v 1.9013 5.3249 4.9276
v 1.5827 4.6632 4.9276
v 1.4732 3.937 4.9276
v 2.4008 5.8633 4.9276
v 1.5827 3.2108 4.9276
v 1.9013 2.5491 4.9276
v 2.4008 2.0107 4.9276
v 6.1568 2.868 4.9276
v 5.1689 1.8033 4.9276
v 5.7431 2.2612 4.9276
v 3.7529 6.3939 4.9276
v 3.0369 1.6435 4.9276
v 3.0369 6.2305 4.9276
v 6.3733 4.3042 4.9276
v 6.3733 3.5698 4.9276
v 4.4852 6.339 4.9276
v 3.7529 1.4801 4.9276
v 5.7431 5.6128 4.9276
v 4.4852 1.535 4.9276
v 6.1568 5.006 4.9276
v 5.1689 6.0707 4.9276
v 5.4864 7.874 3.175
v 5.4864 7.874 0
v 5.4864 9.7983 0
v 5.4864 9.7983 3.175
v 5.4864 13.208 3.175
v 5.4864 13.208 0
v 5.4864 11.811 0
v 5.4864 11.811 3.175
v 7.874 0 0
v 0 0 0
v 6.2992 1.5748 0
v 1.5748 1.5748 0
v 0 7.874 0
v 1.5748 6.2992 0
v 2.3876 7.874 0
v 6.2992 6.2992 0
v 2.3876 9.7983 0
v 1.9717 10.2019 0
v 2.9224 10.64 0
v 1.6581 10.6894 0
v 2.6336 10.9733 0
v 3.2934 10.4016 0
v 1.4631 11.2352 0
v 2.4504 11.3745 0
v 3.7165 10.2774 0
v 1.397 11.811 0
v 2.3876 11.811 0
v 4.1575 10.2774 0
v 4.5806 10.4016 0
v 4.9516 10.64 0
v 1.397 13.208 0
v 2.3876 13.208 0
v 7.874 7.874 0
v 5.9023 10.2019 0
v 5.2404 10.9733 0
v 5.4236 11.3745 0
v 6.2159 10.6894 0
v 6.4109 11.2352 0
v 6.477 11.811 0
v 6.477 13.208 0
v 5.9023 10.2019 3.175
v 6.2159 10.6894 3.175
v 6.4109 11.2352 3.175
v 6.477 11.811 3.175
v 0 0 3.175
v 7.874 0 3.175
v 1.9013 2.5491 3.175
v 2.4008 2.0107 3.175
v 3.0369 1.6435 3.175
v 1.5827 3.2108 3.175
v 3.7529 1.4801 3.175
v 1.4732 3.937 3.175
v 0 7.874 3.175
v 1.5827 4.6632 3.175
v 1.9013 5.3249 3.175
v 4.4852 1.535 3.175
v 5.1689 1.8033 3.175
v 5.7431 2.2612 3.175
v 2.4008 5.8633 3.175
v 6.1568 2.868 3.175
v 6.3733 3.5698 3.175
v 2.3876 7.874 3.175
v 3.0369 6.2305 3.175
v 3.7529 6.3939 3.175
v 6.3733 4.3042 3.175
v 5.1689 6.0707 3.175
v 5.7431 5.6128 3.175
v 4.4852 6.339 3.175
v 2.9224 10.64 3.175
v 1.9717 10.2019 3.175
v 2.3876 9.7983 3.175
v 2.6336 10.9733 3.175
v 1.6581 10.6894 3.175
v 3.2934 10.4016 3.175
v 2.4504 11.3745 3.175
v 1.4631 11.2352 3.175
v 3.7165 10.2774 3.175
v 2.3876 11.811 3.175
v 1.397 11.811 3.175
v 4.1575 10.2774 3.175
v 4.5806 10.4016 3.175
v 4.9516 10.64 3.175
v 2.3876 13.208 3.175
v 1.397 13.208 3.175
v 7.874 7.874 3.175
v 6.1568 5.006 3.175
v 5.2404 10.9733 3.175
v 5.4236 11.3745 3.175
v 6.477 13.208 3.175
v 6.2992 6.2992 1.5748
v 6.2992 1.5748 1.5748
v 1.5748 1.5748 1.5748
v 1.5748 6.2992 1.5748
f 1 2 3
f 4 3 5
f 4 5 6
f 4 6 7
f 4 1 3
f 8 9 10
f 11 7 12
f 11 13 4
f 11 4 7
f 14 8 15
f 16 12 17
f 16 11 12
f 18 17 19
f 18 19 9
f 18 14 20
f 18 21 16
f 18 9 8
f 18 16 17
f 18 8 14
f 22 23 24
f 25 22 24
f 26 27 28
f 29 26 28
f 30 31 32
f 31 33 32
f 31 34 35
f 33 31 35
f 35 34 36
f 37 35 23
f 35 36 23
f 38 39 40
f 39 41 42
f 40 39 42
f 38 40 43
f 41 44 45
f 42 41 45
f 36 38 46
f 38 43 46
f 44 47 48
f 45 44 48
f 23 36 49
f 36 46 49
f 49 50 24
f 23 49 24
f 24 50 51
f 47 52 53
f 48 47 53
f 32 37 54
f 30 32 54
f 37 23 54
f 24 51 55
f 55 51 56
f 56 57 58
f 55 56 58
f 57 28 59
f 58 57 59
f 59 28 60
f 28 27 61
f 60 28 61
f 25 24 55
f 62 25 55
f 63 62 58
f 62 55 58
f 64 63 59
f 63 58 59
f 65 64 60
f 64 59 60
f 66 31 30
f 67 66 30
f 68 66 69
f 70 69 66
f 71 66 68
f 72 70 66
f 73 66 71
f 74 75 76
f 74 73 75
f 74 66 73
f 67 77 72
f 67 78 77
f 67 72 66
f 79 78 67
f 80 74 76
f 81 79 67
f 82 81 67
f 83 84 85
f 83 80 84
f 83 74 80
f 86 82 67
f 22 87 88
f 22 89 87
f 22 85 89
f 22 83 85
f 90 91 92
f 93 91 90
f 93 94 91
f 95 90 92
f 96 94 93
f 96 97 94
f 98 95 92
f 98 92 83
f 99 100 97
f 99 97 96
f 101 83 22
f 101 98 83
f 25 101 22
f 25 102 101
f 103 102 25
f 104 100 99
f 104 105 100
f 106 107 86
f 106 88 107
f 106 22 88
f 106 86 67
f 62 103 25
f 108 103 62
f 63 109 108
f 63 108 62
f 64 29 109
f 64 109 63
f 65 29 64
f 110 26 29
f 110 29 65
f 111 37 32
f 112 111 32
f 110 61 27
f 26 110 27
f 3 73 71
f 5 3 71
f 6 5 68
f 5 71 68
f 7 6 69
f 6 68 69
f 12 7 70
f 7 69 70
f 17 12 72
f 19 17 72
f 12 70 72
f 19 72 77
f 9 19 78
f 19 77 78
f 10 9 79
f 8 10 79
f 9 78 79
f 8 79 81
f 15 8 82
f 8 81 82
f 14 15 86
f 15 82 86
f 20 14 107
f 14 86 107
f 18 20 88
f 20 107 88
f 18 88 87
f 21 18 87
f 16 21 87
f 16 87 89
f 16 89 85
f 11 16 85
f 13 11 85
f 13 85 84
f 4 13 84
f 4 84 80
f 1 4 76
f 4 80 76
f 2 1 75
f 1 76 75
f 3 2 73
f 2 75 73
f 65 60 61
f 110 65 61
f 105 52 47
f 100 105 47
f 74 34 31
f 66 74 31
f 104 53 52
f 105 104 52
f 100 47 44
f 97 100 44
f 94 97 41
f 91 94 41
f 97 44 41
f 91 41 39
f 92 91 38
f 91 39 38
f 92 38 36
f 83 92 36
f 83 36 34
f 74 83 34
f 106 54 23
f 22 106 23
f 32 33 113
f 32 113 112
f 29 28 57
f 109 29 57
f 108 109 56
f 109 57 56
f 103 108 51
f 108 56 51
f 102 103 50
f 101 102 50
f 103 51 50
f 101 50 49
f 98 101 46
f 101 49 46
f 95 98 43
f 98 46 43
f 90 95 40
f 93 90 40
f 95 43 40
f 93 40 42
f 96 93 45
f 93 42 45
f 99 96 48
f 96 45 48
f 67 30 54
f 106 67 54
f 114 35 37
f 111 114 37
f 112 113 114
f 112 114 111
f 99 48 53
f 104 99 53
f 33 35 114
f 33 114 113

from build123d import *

# Parameters (mm, degrees)
F1_DEPTH = 3.175
F3_DEPTH = 1.7526
F4_W     = 4.7244
F4_H     = 4.7244
F5_DEPTH = 1.5748


with BuildPart() as f1:
    # F0 (on Top) → F1 (new body)
    with BuildSketch(Plane.XY):
        with BuildLine():
            Line((0, 7.874), (0, 0))
            Line((0, 0), (7.874, 0))
            Line((7.874, 0), (7.874, 7.874))
            Line((7.874, 7.874), (5.4864, 7.874))
            Line((5.4864, 7.874), (5.4864, 9.7983))
            ThreePointArc((5.4864, 9.7983), (6.215934, 10.689366), (6.477, 11.811))
            Line((6.477, 11.811), (6.477, 13.208))
            Line((6.477, 13.208), (5.4864, 13.208))
            Line((5.4864, 13.208), (5.4864, 11.811))
            ThreePointArc((5.4864, 11.811), (3.937, 10.2616), (2.3876, 11.811))
            Line((2.3876, 11.811), (2.3876, 13.208))
            Line((2.3876, 13.208), (1.397, 13.208))
            Line((1.397, 13.208), (1.397, 11.811))
            ThreePointArc((1.397, 11.811), (1.658066, 10.689366), (2.3876, 9.7983))
            Line((2.3876, 9.7983), (2.3876, 7.874))
            Line((2.3876, 7.874), (0, 7.874))
        make_face()
    extrude(amount=F1_DEPTH)

    # F2 (on face) → F3 (join)
    with BuildSketch(Plane.XY.offset(3.175)):
        with BuildLine():
            ThreePointArc((6.4008, 3.937), (3.937, 6.4008), (1.4732, 3.937))
            Line((1.4732, 3.937), (6.4008, 3.937))
        make_face()
        with BuildLine():
            Line((6.4008, 3.937), (1.4732, 3.937))
            ThreePointArc((1.4732, 3.937), (3.937, 1.4732), (6.4008, 3.937))
        make_face()
    extrude(amount=F3_DEPTH)

    # F4 (on face) → F5 (cut)
    with BuildSketch(Plane(origin=(0, 0, 0), x_dir=(1, 0, 0), z_dir=(0, 0, -1))):
        with Locations((3.937, -3.937)):
            Rectangle(F4_W, F4_H)
    extrude(amount=-F5_DEPTH, mode=Mode.SUBTRACT)


solid = f1.part
